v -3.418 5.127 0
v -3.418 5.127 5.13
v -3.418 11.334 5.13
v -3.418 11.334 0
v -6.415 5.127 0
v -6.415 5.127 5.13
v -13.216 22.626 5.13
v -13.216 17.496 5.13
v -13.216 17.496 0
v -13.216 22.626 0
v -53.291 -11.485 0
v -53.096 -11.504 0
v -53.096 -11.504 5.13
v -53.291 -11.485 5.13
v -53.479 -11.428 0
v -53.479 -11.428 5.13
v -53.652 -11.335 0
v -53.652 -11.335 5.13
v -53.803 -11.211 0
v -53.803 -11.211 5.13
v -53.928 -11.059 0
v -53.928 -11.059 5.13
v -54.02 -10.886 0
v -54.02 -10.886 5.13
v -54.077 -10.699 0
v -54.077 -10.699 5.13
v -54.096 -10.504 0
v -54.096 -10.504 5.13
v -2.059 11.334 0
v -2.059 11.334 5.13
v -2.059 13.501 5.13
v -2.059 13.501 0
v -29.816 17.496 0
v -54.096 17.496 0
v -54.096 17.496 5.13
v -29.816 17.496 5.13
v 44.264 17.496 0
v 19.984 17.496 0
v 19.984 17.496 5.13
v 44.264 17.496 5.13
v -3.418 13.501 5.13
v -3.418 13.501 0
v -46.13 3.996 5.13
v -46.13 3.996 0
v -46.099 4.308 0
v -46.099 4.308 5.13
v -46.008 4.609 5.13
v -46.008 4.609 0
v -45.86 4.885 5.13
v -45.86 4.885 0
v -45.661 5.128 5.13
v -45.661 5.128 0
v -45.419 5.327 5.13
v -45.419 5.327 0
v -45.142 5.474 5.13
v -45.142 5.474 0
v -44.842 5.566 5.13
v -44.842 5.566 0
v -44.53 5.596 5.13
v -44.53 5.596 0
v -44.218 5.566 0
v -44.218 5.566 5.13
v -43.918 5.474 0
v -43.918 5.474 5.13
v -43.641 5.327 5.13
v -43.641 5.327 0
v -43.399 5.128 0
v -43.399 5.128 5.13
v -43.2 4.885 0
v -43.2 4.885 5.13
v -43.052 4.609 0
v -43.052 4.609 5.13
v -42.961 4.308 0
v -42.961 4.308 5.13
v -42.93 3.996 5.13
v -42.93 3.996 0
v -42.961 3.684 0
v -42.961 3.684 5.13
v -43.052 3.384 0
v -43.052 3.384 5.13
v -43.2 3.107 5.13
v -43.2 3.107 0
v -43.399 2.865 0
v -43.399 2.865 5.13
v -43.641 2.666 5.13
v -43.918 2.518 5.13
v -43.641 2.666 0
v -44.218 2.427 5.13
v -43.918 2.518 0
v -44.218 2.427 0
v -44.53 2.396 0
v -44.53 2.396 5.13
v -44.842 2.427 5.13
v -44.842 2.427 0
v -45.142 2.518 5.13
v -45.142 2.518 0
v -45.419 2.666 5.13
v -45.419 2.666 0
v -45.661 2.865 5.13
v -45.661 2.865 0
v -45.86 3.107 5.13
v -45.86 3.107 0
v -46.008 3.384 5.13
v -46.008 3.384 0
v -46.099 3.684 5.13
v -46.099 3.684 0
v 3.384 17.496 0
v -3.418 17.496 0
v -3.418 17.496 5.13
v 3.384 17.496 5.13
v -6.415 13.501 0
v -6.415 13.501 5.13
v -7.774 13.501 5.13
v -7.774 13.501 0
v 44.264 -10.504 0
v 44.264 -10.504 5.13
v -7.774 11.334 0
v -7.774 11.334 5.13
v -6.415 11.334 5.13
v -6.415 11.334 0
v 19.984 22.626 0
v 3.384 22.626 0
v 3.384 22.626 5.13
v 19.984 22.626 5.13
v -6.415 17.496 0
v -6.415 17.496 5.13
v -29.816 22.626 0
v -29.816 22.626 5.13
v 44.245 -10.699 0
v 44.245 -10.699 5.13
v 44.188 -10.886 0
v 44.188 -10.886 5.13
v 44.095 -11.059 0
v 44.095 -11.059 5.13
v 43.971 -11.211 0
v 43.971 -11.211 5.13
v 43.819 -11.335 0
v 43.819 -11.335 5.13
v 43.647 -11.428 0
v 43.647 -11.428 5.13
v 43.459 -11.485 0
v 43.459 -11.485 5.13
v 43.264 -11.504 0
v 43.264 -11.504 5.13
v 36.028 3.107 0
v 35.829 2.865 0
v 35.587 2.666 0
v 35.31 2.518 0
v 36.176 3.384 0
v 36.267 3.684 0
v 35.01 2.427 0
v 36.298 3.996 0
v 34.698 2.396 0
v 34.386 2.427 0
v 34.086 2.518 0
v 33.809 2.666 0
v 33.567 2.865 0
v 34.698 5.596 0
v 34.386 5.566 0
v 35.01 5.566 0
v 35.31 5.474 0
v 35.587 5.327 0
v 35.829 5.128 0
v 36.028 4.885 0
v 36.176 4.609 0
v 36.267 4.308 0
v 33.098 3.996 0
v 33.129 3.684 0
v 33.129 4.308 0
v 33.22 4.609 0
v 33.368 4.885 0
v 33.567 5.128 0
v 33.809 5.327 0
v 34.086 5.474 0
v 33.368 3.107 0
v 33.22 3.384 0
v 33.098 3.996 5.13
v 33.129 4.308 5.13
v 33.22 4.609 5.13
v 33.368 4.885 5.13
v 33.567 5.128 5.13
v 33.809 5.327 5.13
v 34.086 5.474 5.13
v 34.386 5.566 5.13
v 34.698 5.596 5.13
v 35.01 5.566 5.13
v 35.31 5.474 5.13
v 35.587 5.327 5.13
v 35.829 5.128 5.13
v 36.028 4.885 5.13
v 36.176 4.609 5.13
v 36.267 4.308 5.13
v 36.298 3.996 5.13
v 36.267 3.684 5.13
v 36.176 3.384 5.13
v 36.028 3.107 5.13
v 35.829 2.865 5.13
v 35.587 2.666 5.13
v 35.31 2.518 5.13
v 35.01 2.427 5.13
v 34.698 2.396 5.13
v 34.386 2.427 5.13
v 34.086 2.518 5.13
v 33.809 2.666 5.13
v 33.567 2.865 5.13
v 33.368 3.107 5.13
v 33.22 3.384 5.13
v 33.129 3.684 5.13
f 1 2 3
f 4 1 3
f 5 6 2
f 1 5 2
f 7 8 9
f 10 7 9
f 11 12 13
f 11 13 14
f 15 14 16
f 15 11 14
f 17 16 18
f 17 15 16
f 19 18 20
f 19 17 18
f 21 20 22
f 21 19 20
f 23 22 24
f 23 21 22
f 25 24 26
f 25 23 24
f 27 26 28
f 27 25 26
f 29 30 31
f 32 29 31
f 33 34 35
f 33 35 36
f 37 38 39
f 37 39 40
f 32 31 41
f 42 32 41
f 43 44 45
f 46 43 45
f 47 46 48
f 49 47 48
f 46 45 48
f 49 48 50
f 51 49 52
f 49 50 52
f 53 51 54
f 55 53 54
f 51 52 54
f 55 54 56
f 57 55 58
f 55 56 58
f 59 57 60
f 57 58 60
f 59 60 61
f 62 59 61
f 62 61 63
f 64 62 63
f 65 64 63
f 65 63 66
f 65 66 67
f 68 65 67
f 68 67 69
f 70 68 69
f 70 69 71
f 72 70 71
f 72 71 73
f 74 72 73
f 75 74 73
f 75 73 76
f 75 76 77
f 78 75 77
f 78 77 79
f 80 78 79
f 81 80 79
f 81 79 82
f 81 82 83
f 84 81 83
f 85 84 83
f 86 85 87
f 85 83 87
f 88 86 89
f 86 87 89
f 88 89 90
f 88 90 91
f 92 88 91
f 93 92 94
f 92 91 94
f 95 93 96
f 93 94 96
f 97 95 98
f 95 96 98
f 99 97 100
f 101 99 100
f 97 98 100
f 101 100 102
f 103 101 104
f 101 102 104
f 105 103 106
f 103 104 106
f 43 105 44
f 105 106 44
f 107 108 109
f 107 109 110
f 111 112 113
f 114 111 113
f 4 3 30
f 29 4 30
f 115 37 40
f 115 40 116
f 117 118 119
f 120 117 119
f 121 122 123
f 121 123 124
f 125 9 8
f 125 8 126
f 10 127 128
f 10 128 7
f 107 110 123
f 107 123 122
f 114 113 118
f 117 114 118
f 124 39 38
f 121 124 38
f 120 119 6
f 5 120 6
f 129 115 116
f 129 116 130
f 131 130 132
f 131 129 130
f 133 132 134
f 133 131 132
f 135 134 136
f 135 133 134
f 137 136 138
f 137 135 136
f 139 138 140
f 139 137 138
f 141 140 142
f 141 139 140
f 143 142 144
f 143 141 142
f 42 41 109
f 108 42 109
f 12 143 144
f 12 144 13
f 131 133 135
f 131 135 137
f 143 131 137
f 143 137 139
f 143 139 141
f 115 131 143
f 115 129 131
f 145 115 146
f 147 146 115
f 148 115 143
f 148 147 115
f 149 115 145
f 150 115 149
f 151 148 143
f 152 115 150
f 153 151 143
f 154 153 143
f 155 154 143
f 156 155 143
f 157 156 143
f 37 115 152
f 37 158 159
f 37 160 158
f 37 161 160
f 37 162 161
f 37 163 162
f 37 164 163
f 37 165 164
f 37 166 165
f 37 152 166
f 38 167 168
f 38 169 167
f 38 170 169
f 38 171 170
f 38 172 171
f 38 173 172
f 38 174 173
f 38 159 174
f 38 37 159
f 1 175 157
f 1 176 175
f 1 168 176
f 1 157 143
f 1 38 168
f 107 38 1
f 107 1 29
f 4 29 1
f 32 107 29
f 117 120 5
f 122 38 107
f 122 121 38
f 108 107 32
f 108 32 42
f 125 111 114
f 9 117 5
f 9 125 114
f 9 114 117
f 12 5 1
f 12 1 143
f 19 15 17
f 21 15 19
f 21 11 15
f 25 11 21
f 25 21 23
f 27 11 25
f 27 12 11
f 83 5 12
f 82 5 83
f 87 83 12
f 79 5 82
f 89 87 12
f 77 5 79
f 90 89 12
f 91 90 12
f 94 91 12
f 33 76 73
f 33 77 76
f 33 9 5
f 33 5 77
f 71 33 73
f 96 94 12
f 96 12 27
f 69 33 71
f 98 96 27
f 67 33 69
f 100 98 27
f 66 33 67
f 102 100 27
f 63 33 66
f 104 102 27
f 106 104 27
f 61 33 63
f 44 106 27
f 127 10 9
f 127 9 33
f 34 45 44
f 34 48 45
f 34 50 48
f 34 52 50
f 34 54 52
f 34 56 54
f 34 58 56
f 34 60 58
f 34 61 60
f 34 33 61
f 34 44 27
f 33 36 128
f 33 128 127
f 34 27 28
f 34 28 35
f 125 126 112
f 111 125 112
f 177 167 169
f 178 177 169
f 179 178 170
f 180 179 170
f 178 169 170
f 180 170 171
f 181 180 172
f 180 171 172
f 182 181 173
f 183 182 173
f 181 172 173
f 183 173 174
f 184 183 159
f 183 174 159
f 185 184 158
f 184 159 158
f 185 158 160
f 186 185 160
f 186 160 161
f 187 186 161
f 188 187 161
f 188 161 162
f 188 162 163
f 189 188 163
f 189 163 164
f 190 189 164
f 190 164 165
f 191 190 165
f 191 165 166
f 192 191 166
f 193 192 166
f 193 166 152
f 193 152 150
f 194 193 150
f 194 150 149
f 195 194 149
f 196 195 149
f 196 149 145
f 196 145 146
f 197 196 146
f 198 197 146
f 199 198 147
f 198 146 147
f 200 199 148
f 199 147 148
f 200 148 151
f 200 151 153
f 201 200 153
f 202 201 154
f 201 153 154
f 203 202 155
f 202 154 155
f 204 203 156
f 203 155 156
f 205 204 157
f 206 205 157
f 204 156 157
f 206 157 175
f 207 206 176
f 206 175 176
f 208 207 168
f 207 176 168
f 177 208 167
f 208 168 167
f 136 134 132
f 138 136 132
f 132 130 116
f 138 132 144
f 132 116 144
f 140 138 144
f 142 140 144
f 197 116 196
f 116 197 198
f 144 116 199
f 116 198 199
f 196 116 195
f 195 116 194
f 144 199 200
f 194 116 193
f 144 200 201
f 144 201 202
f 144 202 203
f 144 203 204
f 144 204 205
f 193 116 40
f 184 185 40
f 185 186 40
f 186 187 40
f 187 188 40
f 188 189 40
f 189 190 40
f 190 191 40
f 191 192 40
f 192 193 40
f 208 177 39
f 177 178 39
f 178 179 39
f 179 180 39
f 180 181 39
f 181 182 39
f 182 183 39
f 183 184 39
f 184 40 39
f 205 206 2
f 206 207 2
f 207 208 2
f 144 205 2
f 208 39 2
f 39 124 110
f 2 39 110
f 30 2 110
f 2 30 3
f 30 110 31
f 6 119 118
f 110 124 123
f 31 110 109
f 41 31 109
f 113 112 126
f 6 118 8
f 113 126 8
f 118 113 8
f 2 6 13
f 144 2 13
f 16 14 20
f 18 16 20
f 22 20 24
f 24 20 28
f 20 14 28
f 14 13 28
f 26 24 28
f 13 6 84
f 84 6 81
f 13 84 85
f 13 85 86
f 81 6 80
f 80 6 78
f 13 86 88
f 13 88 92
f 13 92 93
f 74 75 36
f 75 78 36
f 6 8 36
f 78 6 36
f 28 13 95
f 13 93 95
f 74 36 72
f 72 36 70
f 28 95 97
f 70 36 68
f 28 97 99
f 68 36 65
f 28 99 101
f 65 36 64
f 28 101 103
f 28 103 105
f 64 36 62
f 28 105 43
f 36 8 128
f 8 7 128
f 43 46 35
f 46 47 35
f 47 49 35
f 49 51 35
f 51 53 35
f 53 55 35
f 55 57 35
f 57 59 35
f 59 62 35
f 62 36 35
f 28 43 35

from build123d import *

# Parameters (mm, degrees)
MAIN_DEPTH               = 5.13
M3_CLEARANCE_HOLE1_D     = 3.2
M3_CLEARANCE_HOLE1_DEPTH = 5.13
SKETCH4_W                = 16.6
SKETCH4_H                = 5.13
TOP_TABS_DEPTH           = 5.13
T_SLOT_DEPTH             = 1
T_SLOT_DEPTH_BACK        = 6.13


with BuildPart() as part:
    # Sketch1 → Main (new body)
    with BuildSketch(Plane.XY):
        with BuildLine():
            Line((-54.096109727, 17.496253248), (44.263890273, 17.496253248))
            Line((44.263890273, 17.496253248), (44.263890273, -10.503746752))
            ThreePointArc((44.263890273, -10.503746752), (43.970997054, -11.210853533), (43.263890273, -11.503746752))
            Line((43.263890273, -11.503746752), (-53.096109727, -11.503746752))
            ThreePointArc((-53.096109727, -11.503746752), (-53.803216508, -11.210853533), (-54.096109727, -10.503746752))
            Line((-54.096109727, -10.503746752), (-54.096109727, 17.496253248))
        make_face()
    extrude(amount=MAIN_DEPTH)

    # M3 Clearance Hole1
    with Locations(Plane.XY.offset(5.13)):
        with Locations((-44.530109727, 3.996253248), (34.697890273, 3.996253248)):
            Hole(M3_CLEARANCE_HOLE1_D / 2, depth=M3_CLEARANCE_HOLE1_DEPTH)

    # Sketch4 → top tabs (add)
    with BuildSketch(Plane(origin=(0, 17.496253248, 0), x_dir=(1, 0, 0), z_dir=(0, 1, 0))):
        with Locations((11.683890273, -2.565)):
            Rectangle(SKETCH4_W, SKETCH4_H)
        with Locations((-21.516109727, -2.565)):
            Rectangle(SKETCH4_W, SKETCH4_H)
    extrude(amount=TOP_TABS_DEPTH)

    # Sketch5 → t-slot (cut, two sides)
    with BuildSketch(Plane.XY.offset(5.13)) as t_slot_sk:
        Polygon((-6.414608826, 144.274852992), (-6.414608826, 17.496253838), (-6.414608826, 13.501253838), (-7.773611823, 13.501254105), (-7.77361225, 11.334254105), (-6.41461225, 11.334253838), (-6.414613471, 5.127253838), (-3.417613471, 5.127253248), (-3.41761225, 11.334253248), (-2.05861225, 11.334252981), (-2.058611823, 13.501252981), (-3.417610628, 13.501253248), (-3.417610628, 17.496253248), (-3.417610628, 144.274852403), (-3.41756075, 397.832050712), (-6.414558948, 397.832051301), align=None)
    extrude(amount=T_SLOT_DEPTH, mode=Mode.SUBTRACT)
    extrude(t_slot_sk.sketch, amount=-T_SLOT_DEPTH_BACK, mode=Mode.SUBTRACT)


solid = part.part
